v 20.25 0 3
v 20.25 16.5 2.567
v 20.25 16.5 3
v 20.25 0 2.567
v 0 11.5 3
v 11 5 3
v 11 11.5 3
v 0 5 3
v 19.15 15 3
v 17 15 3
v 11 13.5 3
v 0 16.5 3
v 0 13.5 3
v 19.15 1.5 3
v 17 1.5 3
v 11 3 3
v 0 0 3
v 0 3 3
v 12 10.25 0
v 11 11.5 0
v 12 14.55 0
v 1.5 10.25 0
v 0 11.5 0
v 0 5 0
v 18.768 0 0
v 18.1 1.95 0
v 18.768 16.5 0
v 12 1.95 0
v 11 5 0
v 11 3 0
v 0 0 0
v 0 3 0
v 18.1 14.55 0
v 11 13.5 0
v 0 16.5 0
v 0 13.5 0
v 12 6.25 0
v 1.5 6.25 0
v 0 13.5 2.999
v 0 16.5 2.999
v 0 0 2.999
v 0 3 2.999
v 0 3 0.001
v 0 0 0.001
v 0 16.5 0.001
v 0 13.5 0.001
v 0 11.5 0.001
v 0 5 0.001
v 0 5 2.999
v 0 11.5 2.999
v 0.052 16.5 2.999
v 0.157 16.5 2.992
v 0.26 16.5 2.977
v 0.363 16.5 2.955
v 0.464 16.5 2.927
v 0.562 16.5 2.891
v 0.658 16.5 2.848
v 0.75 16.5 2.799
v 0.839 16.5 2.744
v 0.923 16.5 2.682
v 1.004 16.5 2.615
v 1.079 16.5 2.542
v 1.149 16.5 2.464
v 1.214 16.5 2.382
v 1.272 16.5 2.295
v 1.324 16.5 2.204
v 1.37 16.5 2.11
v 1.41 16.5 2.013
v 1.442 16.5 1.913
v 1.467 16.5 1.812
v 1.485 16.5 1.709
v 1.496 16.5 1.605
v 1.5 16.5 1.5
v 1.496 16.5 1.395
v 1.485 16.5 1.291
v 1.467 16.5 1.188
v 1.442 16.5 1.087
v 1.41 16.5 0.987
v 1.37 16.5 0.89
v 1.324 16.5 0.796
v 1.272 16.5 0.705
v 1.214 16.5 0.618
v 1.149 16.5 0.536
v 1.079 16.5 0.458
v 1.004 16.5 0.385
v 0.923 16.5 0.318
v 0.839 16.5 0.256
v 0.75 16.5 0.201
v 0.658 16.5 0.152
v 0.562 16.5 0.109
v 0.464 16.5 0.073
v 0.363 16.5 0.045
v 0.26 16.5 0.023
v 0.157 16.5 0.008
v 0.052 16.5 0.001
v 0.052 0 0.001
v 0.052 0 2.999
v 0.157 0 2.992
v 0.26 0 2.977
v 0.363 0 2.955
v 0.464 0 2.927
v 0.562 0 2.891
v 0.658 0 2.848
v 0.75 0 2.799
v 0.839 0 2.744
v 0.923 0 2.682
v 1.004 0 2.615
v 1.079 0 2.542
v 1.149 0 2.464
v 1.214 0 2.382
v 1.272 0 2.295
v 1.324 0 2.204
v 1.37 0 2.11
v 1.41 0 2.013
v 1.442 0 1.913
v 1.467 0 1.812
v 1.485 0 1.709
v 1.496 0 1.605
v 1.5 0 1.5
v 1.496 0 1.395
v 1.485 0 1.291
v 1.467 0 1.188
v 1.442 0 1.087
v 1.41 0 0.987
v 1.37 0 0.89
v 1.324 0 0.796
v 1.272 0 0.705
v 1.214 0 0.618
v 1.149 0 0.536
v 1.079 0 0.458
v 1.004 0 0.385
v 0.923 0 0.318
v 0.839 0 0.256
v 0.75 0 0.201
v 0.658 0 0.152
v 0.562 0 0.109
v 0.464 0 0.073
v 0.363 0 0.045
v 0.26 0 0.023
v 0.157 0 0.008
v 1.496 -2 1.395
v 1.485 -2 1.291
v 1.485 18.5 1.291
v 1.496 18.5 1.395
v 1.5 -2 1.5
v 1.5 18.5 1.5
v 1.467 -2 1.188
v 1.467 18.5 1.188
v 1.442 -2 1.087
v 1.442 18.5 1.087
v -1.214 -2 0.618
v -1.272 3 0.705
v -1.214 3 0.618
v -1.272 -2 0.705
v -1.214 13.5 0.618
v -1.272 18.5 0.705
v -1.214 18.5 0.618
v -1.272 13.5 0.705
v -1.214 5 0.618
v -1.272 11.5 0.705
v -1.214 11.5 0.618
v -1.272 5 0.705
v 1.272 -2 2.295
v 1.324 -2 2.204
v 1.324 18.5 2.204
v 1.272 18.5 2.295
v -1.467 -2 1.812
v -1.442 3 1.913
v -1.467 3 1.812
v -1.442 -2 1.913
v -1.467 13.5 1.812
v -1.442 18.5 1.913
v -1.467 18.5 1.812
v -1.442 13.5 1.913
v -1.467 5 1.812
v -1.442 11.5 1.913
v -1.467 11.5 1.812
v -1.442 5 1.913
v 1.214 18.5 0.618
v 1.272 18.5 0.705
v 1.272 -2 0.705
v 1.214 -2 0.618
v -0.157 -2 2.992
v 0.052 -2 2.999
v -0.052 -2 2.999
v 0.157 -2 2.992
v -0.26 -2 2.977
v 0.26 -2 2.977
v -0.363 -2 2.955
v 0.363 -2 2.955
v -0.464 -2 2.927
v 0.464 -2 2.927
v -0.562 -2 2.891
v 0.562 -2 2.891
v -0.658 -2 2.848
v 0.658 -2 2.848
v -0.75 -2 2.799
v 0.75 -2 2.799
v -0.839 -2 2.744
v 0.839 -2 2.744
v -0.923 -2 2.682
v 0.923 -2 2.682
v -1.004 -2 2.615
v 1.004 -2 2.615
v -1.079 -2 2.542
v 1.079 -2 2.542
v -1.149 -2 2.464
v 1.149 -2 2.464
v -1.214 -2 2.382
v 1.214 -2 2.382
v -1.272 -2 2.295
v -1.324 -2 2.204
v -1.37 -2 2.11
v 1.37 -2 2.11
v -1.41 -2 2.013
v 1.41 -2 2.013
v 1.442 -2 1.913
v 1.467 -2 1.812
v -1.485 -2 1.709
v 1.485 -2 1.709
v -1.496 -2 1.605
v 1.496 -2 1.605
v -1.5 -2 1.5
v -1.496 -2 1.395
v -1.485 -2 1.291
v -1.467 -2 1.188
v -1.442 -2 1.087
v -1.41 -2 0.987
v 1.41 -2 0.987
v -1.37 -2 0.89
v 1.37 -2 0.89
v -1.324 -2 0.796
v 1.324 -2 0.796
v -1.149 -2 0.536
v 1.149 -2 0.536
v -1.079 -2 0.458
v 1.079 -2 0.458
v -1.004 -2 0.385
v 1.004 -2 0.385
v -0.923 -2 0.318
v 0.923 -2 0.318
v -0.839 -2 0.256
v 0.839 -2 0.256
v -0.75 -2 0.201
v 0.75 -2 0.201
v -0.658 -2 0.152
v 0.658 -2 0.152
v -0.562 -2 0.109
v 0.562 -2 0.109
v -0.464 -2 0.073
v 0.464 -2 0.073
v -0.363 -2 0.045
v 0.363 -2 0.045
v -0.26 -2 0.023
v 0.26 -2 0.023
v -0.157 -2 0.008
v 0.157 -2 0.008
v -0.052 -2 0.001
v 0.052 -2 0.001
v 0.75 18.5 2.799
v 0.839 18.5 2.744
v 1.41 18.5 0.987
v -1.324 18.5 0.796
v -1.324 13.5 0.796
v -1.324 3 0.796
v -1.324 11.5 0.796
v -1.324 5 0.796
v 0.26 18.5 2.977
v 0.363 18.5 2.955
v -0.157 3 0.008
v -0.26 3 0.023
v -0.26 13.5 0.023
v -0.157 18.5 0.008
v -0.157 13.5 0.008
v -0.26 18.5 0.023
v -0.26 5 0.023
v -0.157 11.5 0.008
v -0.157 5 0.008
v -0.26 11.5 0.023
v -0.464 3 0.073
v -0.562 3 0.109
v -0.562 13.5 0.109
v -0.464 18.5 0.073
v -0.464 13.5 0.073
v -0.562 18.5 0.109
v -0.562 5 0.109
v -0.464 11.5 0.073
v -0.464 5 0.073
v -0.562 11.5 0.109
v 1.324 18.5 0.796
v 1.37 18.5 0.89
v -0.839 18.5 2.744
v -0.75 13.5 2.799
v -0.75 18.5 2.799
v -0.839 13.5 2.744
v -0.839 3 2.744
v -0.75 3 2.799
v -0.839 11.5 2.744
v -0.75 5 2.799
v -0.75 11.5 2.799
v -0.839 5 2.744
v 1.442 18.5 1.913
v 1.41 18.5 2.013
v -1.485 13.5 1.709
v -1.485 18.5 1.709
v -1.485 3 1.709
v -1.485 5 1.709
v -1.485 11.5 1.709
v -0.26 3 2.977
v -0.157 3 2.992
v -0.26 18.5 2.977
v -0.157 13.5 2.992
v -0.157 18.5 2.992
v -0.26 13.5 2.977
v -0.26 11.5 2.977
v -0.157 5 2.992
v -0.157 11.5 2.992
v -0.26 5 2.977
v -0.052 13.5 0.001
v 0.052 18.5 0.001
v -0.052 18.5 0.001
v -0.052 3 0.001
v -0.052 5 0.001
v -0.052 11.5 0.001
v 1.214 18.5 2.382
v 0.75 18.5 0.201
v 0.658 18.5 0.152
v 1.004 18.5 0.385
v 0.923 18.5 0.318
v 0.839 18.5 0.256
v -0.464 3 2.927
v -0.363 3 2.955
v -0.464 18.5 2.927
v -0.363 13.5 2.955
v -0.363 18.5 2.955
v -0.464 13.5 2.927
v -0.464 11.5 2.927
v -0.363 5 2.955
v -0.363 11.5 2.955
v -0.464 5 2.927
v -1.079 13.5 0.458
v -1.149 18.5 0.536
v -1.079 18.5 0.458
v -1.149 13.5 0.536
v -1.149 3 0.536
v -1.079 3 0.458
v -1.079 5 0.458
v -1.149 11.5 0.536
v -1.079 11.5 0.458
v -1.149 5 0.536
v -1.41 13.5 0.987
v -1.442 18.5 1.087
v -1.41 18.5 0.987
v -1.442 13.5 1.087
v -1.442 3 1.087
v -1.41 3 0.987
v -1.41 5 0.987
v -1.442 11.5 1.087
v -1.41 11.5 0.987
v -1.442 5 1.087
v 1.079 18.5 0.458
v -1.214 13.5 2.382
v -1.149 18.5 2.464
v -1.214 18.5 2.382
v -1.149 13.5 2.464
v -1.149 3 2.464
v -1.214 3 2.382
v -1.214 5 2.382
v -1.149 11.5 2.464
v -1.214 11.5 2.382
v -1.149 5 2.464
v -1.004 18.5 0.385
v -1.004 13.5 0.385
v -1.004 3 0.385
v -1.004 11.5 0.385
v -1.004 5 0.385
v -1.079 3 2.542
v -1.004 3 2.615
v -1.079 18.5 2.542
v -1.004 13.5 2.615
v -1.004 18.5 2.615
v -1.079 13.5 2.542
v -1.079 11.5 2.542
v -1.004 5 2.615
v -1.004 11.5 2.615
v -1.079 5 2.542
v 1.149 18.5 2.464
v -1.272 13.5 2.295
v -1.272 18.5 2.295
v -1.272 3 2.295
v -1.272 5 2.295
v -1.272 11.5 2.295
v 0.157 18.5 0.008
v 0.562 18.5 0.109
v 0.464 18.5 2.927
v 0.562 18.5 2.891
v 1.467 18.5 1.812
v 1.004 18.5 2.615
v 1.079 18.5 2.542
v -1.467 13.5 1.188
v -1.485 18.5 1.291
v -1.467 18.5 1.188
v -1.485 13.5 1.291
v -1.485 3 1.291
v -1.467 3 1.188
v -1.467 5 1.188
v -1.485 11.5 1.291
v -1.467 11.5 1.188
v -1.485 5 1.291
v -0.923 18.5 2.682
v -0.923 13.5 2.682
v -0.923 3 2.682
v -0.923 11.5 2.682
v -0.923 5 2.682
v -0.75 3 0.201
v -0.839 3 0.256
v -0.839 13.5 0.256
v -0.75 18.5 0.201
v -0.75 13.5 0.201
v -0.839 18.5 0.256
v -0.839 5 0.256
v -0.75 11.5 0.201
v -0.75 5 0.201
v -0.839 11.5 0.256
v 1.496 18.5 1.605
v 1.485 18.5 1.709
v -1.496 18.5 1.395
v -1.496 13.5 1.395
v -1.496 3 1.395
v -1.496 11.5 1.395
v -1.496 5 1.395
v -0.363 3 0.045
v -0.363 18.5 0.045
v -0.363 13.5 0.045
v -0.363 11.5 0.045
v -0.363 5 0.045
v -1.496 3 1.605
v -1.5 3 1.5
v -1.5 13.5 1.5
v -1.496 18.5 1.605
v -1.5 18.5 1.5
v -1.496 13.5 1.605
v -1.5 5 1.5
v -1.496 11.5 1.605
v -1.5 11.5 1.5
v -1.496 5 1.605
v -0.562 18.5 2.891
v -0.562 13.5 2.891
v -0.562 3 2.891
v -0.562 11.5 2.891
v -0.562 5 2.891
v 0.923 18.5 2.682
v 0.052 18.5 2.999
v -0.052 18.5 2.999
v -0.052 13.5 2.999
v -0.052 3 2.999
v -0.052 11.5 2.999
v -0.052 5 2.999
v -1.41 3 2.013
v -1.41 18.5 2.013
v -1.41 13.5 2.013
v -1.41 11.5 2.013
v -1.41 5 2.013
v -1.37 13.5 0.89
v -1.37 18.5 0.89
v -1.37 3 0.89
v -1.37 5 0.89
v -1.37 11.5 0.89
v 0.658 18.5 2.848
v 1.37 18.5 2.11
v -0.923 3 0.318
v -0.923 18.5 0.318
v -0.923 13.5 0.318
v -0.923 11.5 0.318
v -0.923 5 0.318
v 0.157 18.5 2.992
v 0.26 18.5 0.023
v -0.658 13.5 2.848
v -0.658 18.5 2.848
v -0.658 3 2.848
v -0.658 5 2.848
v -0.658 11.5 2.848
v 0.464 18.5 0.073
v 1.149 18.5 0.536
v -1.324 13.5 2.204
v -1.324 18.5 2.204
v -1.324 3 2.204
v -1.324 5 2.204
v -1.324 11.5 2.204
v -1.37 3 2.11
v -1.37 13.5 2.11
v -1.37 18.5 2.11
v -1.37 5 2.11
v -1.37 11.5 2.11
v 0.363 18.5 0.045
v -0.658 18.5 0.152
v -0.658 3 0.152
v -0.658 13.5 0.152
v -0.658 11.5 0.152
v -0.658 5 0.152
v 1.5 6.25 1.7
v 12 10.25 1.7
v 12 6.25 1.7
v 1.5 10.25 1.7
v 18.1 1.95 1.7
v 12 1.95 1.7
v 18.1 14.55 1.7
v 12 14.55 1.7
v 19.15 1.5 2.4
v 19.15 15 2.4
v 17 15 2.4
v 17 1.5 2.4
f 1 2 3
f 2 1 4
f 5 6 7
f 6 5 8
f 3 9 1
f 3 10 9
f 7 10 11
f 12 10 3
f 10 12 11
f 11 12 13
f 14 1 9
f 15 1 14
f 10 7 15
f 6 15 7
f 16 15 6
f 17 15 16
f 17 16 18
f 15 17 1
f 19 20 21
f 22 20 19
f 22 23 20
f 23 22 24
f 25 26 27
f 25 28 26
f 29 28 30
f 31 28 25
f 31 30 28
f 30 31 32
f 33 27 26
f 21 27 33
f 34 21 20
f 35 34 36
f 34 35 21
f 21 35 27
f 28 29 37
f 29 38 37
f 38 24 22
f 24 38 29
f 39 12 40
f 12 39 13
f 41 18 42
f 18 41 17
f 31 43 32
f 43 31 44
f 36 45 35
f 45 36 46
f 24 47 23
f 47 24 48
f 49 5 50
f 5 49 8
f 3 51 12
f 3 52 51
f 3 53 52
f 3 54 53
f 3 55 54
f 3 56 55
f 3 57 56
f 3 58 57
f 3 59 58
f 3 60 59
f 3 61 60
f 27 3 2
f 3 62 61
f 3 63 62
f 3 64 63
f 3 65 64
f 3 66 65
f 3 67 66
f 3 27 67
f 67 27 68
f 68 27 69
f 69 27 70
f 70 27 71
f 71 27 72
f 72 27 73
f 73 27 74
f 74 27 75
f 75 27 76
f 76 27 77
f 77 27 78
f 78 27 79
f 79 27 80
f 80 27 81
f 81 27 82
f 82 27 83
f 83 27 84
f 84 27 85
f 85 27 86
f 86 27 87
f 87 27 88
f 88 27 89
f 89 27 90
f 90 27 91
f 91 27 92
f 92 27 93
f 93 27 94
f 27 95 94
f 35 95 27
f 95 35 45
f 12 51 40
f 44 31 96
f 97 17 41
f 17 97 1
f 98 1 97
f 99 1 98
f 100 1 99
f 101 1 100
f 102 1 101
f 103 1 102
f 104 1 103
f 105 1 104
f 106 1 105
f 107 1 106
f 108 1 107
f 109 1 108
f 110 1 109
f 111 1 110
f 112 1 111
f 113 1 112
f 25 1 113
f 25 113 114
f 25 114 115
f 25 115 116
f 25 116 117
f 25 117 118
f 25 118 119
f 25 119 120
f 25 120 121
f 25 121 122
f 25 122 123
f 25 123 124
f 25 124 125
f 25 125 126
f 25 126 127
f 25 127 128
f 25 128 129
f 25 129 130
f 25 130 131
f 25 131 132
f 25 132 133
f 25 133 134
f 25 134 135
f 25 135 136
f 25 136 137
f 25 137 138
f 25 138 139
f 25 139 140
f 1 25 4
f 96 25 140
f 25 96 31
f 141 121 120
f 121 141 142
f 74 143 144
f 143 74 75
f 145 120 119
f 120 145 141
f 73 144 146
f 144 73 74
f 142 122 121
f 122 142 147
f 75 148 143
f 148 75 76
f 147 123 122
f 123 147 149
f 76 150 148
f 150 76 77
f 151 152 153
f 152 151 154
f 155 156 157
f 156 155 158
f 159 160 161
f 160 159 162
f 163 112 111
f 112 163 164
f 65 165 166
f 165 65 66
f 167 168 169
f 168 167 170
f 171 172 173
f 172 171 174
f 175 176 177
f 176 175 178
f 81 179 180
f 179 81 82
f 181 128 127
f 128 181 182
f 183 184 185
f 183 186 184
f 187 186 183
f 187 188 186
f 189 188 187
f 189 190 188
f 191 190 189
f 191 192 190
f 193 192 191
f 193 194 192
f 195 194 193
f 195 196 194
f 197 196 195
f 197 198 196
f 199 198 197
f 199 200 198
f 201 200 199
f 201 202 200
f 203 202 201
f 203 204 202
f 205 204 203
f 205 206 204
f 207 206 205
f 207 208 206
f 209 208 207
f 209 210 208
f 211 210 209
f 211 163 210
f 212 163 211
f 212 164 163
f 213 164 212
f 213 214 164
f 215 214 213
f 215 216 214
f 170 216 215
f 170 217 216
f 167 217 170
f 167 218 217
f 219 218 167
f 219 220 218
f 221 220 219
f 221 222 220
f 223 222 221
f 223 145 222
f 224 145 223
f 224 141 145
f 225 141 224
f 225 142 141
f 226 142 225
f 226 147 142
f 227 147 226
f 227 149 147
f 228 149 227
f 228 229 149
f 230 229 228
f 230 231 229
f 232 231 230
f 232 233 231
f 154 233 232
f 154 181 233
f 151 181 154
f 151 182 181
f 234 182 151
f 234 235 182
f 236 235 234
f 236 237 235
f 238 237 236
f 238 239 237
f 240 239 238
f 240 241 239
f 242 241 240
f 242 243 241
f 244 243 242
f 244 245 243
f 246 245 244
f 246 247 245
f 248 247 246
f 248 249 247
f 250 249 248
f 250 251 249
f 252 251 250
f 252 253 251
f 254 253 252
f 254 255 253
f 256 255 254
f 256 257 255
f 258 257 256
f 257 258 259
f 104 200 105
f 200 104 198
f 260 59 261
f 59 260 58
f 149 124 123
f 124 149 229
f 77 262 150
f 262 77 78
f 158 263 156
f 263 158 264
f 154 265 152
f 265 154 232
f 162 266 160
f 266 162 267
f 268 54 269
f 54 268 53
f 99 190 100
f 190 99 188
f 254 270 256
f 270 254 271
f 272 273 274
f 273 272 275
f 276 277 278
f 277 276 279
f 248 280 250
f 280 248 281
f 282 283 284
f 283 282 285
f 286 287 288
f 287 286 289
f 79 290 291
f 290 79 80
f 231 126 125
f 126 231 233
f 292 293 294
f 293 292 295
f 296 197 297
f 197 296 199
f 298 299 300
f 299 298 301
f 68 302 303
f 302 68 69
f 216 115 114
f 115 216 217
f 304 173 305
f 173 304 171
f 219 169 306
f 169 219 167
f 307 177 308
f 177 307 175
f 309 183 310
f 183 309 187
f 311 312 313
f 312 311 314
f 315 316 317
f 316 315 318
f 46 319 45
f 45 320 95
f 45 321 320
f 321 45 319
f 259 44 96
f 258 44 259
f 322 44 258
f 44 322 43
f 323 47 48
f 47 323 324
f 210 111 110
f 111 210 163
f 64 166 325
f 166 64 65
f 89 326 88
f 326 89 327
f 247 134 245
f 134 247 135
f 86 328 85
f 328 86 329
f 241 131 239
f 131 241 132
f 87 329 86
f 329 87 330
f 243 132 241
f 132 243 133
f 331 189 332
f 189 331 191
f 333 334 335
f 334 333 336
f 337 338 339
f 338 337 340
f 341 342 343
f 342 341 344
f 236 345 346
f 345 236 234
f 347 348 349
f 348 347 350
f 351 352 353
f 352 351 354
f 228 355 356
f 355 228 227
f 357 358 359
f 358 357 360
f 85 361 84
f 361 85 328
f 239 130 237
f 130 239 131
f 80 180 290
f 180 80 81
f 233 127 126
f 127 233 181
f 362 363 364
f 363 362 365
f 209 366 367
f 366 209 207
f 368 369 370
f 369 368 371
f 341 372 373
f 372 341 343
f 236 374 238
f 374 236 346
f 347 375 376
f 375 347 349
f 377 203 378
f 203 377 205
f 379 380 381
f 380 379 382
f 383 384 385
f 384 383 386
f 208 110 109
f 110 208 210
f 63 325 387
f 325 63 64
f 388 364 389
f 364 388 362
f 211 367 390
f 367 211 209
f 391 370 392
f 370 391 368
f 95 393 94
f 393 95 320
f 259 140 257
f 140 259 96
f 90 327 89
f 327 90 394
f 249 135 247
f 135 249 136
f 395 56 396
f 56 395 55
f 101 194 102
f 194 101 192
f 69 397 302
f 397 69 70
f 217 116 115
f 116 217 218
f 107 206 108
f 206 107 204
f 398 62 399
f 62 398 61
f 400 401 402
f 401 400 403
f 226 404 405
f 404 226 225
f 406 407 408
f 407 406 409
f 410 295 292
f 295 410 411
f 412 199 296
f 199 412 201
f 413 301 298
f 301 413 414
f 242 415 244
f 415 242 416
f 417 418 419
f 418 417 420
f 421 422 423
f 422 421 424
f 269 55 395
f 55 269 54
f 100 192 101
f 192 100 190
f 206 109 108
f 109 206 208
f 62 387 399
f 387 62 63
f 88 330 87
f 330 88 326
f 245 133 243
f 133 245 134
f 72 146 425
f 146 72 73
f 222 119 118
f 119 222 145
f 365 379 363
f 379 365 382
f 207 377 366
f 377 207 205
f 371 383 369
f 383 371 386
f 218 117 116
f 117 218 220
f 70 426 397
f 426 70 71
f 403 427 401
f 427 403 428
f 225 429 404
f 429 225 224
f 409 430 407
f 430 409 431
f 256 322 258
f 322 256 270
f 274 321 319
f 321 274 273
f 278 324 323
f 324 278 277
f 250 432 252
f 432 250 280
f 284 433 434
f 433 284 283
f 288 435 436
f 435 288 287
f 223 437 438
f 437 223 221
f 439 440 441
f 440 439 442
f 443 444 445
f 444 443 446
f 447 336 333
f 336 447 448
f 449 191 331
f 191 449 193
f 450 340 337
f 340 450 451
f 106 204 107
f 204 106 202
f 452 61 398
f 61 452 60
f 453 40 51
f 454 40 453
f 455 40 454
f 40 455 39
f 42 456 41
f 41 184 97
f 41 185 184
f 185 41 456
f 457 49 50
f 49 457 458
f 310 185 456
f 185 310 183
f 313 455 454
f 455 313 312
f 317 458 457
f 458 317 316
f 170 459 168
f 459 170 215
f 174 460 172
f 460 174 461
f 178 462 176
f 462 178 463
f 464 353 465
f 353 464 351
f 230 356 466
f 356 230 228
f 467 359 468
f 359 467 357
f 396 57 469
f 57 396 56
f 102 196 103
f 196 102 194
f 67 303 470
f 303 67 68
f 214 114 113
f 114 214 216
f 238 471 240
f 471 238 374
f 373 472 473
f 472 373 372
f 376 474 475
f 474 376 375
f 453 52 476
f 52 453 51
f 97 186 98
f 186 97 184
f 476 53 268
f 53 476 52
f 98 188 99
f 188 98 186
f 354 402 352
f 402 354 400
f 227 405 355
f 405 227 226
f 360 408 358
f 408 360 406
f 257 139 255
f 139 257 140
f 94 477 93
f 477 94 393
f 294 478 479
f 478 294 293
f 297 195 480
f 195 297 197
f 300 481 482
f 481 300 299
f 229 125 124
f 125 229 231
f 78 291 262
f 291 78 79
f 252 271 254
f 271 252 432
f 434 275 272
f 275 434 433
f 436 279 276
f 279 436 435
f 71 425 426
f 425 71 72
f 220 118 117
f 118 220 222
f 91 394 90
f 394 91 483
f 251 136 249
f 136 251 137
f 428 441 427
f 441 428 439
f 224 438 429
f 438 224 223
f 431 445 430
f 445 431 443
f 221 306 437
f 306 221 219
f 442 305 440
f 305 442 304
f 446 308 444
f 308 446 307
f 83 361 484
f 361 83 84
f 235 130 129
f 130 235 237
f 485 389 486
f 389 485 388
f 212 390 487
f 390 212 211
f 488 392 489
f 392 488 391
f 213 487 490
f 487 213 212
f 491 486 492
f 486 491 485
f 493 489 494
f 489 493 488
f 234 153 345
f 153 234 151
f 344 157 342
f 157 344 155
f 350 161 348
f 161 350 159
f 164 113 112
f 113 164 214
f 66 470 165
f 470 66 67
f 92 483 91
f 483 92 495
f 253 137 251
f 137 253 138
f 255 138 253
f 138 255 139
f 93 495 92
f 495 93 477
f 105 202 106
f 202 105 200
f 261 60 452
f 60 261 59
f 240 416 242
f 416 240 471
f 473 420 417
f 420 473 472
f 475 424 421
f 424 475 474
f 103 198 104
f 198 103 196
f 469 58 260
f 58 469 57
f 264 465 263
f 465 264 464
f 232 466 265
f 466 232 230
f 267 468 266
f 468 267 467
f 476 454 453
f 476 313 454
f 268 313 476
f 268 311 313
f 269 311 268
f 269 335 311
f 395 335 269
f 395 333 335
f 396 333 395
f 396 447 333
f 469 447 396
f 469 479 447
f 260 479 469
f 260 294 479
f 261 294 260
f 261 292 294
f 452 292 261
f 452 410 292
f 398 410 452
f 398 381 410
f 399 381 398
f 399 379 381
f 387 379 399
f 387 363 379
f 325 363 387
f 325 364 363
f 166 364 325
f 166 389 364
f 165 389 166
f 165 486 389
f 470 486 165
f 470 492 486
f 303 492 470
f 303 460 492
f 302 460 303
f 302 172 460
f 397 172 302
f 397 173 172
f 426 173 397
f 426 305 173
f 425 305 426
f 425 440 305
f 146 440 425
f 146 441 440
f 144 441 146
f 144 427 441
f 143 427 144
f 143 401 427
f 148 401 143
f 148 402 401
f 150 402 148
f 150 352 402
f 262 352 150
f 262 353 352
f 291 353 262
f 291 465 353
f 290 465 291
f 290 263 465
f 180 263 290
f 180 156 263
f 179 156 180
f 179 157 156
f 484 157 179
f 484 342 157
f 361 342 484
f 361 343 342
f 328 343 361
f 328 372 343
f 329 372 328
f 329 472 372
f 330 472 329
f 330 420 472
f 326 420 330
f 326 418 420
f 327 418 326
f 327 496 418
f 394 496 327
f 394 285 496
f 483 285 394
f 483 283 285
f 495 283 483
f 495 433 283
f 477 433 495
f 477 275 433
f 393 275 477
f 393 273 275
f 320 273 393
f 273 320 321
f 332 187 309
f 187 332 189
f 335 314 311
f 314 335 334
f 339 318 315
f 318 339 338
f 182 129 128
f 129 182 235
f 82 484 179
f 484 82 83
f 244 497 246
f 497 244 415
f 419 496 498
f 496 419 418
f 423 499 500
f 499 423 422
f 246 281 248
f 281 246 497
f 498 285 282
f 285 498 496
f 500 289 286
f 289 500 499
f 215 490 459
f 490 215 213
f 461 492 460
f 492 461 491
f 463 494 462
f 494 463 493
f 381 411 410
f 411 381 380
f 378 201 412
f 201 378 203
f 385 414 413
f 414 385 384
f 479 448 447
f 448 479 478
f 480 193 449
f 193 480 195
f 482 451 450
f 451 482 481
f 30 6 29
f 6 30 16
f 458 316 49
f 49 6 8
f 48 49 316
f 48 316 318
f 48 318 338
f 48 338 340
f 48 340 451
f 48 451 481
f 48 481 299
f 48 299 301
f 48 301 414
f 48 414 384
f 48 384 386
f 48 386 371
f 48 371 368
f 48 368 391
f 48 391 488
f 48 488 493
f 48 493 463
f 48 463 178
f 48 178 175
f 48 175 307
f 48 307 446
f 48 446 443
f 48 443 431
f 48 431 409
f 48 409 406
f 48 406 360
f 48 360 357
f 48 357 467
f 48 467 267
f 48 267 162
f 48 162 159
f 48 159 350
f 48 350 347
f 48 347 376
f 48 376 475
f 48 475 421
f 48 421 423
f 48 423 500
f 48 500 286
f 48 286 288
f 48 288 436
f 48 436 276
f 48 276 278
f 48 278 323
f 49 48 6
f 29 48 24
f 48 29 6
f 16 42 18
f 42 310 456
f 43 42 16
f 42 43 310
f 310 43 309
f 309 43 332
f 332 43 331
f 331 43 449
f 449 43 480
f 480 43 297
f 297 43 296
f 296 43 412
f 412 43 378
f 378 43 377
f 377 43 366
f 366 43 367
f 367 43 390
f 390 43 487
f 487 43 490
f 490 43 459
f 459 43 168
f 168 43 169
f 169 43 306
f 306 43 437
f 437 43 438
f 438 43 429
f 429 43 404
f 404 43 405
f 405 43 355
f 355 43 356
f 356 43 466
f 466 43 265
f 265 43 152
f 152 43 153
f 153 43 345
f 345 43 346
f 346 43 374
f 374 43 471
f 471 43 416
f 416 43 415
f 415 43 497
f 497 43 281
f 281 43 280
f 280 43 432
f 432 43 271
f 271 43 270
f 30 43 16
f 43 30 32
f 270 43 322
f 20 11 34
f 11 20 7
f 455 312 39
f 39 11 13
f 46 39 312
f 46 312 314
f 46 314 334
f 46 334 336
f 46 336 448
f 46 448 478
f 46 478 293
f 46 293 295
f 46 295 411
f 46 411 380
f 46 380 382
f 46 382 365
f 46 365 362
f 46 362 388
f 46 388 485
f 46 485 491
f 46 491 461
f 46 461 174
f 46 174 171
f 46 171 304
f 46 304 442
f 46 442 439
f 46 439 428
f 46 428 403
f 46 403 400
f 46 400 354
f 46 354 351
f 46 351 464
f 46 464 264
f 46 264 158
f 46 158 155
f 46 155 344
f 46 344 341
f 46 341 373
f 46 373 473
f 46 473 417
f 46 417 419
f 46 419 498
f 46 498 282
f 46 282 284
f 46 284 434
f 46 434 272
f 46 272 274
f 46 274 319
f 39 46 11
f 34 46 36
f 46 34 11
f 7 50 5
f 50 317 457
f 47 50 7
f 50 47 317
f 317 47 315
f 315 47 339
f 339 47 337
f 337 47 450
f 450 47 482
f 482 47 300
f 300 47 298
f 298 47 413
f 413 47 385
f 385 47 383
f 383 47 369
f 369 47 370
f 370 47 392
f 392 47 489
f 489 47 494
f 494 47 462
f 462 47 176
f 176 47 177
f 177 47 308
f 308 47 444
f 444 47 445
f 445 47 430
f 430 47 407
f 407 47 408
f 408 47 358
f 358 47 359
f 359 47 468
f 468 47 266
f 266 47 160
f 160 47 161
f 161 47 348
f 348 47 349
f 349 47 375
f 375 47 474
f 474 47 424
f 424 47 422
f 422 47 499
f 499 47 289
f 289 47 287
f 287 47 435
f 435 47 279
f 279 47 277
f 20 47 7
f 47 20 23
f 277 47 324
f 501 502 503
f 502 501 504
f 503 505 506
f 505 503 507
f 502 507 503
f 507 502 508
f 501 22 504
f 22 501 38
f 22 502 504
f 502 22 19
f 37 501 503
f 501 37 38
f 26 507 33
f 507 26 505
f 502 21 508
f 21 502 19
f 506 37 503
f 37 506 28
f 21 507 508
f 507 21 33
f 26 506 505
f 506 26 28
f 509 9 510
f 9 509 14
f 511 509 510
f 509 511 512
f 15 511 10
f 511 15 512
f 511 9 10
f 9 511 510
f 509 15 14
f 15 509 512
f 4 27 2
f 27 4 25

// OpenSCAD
$fn=90;

barLength = 20.5;
barDiameter = 3;

cubeLength = 21.75 - barDiameter/2;
cubeWidth = 16.5;
cubeHeight = barDiameter;

difference(){
    massivePart();
    #cutOut();
}

module massivePart(){
    cube([cubeLength, cubeWidth, cubeHeight], center = false);
	rotate([-90,0,0])
		translate([0, -barDiameter/2, -(barLength-cubeWidth)/2])
			cylinder(h = barLength, d = barDiameter, center = false);
}

module cutOut(){
	union(){
		slits();
		topValley();
		bottomValley();
		slope();
	}
}

module slits(){
	slitWidth = 2;
	slitHeight = cubeHeight+1;
	slitLength = 15;
	translate([-4, 3, -(slitHeight-cubeHeight)/2])
		cube([slitLength, slitWidth, slitHeight], center = false);
	translate([-4, cubeWidth-3-slitWidth, -(slitHeight-cubeHeight)/2])
		cube([slitLength, slitWidth, slitHeight], center = false);
}

module topValley(){
	valleyLength = 13.5;
	translate([17, (cubeWidth-valleyLength)/2, 2.4])
		cube([2.15, valleyLength, 1], center = false);
}

module bottomValley(){
	valley_1_Width = 4;
	valley_2_Length= 12.6;
	valleyDepth = 1.7;
	depthOvershoot = 1;
	translate([barDiameter/2, (cubeWidth-valley_1_Width)/2, -depthOvershoot])
		cube([15, valley_1_Width, valleyDepth+depthOvershoot], center = false);
	translate([12, (cubeWidth-valley_2_Length)/2, -depthOvershoot])
		cube([6.1, valley_2_Length, valleyDepth+depthOvershoot], center = false);
}

module slope(){
	valleyLength = 13.5;
	translate([20.5, -0.5, -1])
		rotate([0, -60, 0])
			cube([4, cubeWidth+1, 2], center = false);
}
